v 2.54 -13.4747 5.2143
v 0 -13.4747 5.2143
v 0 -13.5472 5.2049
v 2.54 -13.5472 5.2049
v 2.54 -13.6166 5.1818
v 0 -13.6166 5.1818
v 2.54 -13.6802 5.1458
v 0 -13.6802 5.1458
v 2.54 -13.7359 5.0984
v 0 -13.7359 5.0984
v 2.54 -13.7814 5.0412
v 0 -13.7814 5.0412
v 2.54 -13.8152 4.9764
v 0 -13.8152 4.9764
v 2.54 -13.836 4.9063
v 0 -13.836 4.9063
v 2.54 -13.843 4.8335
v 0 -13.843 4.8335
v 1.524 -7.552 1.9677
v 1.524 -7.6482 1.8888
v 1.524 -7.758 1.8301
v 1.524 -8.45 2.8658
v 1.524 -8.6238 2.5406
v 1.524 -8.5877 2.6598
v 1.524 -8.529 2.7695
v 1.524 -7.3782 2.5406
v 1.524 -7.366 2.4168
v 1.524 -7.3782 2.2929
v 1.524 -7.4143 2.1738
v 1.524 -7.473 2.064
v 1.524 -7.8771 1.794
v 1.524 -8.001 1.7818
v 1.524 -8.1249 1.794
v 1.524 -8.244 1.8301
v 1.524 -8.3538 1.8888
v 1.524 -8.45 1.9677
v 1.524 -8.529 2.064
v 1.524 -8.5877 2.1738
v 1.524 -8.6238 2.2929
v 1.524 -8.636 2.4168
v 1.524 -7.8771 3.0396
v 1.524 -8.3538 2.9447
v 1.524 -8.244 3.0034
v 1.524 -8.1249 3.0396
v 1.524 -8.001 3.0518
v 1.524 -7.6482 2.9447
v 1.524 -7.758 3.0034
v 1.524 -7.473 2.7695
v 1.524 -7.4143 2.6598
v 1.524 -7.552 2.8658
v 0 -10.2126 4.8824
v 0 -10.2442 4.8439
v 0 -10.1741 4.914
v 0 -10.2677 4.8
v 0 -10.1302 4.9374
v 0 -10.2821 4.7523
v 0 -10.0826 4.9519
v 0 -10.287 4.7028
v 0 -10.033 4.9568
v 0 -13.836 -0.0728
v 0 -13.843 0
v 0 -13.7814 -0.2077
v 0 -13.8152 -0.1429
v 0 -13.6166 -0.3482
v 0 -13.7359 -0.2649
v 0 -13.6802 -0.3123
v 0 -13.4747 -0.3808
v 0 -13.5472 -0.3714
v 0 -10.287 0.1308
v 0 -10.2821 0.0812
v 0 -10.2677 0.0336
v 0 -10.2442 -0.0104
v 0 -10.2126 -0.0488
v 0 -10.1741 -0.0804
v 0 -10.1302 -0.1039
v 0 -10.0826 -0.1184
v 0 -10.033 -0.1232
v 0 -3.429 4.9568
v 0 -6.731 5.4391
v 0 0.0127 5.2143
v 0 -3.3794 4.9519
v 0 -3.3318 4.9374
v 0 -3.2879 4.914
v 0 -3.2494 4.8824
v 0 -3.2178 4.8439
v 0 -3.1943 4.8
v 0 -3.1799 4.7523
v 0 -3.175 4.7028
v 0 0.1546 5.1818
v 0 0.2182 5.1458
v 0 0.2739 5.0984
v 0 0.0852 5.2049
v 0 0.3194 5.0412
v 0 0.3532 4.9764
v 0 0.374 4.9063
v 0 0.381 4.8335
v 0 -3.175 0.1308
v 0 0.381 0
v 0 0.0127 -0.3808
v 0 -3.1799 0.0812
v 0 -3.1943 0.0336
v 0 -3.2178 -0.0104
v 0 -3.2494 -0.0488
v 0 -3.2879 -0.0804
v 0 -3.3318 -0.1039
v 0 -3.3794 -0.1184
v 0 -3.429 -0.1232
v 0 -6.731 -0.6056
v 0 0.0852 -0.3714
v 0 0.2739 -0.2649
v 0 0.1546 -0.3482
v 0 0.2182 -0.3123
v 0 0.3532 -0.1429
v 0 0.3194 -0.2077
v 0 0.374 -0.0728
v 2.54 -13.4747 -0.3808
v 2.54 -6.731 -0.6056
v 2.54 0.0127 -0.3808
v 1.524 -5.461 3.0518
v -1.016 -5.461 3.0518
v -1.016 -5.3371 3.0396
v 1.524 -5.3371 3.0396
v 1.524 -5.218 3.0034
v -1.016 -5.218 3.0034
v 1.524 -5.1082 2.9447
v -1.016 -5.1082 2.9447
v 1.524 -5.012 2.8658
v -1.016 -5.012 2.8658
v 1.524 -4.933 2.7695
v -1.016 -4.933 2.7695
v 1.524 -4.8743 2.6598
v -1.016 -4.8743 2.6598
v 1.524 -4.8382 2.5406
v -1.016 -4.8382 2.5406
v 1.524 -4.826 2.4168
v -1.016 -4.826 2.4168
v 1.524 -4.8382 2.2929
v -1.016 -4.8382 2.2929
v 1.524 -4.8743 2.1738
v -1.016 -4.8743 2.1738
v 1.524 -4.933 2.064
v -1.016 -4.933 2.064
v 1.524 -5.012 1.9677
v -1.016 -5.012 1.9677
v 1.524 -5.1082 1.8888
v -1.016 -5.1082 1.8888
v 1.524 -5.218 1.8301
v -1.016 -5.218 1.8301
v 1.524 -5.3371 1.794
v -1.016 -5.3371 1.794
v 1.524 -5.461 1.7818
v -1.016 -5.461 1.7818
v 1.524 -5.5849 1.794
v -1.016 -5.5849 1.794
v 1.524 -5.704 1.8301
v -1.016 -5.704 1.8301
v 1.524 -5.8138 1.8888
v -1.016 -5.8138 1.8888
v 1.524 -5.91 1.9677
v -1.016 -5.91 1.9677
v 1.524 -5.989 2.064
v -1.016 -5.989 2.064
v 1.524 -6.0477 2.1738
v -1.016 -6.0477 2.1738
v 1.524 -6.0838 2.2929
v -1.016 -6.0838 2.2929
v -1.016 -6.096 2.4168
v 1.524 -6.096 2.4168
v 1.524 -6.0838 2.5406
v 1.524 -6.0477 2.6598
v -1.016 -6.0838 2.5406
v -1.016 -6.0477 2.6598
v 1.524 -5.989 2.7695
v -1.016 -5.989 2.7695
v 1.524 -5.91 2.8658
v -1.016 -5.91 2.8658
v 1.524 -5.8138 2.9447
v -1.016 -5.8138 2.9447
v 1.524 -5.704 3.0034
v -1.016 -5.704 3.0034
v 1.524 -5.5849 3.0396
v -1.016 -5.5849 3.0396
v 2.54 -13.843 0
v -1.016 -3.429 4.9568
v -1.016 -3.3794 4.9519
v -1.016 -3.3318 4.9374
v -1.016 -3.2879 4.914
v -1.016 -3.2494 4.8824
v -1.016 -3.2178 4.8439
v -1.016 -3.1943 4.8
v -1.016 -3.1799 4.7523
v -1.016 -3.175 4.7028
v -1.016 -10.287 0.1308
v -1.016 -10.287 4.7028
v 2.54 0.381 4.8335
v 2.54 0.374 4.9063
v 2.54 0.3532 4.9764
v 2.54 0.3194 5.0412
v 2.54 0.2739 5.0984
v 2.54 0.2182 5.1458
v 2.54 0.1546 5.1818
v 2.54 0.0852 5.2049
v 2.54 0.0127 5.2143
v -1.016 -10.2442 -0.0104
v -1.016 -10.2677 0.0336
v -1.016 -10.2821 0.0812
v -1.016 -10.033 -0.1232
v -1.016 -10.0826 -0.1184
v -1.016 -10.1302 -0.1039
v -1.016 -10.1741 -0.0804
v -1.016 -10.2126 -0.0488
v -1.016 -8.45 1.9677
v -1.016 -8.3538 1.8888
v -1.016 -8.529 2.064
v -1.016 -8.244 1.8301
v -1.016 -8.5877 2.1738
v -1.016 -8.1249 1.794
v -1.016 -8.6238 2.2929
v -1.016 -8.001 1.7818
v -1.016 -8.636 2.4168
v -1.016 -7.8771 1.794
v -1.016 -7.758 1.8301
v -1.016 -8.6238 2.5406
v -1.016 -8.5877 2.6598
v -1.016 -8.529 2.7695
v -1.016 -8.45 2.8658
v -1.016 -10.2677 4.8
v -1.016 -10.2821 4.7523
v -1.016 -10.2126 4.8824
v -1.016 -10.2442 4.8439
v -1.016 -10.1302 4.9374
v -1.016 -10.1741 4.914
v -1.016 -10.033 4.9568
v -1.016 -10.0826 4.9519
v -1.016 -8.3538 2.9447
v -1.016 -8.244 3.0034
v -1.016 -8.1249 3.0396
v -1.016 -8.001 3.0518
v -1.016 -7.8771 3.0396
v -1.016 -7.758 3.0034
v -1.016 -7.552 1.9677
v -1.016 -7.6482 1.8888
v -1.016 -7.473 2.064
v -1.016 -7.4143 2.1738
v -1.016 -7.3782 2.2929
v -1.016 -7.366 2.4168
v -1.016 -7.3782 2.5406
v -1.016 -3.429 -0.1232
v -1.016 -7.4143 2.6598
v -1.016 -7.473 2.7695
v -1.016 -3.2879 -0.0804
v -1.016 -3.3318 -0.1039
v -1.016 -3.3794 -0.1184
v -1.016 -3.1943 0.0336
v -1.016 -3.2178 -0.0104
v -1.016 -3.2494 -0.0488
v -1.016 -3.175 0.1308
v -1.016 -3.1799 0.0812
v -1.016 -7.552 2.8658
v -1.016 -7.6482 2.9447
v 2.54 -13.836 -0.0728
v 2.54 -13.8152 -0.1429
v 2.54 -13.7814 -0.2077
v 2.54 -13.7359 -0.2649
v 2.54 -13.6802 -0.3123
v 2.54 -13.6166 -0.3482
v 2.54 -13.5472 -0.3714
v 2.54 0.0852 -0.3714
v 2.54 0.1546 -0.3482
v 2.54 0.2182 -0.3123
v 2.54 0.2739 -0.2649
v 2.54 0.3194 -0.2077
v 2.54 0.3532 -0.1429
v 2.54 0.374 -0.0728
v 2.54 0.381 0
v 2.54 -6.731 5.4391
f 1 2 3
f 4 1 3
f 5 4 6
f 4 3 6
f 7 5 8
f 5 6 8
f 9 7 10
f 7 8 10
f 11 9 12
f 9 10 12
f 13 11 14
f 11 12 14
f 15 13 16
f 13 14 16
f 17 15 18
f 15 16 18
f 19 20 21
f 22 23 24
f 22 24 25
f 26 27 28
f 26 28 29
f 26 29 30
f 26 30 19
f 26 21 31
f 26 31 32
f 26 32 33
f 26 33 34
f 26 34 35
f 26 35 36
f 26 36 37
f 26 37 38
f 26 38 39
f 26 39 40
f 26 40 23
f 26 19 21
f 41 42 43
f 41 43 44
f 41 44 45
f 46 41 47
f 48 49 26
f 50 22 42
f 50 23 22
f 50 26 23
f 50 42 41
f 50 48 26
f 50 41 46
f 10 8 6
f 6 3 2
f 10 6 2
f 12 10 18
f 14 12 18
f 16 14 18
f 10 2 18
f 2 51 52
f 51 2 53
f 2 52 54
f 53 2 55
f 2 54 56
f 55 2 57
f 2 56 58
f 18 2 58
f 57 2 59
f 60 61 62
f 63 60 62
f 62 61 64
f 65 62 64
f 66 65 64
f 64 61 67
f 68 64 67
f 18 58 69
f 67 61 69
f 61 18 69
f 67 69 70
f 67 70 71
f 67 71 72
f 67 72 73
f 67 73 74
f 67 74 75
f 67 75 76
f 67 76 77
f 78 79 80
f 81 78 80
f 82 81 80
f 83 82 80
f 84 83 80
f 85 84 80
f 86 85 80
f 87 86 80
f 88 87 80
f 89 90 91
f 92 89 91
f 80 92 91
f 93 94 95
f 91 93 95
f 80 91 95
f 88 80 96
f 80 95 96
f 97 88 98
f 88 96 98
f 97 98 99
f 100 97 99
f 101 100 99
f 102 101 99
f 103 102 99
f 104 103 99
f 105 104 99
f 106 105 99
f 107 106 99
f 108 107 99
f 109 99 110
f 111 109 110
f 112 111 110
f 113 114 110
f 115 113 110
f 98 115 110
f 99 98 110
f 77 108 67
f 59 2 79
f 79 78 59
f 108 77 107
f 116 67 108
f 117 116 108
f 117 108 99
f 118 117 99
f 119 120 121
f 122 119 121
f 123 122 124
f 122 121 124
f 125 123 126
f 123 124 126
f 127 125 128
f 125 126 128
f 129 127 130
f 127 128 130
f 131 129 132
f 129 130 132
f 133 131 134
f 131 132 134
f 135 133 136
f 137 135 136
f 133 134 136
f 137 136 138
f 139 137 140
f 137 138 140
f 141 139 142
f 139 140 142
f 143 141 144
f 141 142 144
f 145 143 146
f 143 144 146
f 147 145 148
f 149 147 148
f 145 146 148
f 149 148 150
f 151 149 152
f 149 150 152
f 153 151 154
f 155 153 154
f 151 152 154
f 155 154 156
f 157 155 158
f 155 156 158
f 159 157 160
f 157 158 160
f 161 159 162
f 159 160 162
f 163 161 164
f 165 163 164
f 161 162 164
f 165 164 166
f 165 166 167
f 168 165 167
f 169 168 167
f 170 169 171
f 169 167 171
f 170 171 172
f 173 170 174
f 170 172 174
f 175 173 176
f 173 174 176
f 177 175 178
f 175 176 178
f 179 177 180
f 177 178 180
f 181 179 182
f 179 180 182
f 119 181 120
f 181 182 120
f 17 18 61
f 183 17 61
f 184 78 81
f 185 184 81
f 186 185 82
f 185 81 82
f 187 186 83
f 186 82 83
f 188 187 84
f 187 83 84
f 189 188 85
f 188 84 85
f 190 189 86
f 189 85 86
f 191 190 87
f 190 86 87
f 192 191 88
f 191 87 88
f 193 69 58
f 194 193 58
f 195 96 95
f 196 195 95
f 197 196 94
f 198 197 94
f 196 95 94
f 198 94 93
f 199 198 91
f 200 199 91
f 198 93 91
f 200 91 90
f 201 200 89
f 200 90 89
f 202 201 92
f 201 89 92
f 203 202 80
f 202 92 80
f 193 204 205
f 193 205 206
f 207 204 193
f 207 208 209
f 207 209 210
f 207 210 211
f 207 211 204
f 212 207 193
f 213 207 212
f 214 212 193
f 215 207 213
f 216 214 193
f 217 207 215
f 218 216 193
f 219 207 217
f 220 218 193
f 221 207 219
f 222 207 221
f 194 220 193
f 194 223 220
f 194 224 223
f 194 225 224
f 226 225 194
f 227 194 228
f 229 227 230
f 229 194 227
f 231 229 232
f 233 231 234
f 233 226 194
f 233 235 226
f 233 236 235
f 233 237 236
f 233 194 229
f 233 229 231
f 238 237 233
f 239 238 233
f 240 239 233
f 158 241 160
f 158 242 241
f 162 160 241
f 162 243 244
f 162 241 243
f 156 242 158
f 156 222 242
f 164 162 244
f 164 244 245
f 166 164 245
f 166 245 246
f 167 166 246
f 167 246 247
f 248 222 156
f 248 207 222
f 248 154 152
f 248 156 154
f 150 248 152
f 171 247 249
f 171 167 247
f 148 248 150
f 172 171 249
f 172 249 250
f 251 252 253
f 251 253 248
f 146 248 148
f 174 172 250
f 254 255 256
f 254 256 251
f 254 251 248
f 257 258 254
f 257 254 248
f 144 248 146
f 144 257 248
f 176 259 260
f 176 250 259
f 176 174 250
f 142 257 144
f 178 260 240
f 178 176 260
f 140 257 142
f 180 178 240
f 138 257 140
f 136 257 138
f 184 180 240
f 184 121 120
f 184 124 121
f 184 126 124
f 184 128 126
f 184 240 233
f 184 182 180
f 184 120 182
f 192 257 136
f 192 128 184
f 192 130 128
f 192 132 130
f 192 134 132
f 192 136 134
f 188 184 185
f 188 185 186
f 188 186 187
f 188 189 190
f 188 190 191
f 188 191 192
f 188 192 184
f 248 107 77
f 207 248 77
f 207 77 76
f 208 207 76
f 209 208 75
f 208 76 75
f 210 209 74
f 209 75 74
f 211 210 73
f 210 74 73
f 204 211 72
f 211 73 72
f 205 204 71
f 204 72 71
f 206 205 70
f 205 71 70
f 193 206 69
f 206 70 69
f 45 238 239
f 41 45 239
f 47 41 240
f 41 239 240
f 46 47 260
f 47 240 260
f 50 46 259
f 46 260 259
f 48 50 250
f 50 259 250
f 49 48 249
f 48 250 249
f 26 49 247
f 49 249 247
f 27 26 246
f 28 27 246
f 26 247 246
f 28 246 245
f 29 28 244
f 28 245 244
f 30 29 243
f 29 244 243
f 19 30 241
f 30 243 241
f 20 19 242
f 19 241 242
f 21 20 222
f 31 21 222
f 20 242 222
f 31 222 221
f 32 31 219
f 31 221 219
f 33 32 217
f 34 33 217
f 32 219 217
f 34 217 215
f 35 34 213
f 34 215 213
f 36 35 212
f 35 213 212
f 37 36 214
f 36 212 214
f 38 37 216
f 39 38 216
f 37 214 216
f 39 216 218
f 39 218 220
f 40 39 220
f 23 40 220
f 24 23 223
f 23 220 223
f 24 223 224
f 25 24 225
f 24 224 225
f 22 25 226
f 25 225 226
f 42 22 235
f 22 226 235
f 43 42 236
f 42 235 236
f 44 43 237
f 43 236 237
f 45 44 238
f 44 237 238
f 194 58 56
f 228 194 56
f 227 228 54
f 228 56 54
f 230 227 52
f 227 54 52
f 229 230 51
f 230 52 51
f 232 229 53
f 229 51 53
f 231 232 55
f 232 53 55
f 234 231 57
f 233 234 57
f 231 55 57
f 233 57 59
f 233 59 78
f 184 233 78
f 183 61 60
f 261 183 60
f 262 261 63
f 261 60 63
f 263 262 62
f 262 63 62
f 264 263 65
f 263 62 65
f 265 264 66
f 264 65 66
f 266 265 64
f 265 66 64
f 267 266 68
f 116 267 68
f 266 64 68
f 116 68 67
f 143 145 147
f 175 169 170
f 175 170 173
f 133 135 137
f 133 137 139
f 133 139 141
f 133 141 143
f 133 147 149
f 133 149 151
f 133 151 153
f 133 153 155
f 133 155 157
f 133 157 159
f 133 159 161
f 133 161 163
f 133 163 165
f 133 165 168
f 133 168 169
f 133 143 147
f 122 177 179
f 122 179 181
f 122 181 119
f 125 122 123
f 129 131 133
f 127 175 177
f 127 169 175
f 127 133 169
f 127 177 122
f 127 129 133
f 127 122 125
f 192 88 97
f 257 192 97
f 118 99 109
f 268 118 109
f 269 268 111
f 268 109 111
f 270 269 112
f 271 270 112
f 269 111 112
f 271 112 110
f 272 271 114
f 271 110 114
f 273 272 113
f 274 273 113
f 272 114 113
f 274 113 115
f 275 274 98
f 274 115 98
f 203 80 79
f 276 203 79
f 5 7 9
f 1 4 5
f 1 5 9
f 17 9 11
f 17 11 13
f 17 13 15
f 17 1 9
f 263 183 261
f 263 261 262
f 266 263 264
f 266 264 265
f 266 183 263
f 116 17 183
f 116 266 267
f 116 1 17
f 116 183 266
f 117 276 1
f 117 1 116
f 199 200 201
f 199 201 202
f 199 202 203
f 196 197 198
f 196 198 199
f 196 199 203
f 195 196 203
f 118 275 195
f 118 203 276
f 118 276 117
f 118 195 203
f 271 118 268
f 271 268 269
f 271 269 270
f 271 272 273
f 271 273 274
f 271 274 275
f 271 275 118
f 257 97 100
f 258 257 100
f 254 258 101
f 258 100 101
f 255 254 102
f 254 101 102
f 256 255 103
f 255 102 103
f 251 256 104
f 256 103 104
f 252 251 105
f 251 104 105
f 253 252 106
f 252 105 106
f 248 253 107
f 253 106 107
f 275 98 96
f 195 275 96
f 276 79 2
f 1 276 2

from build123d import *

# Parameters (mm, degrees)
BOSS_EXTRUDE1_DEPTH = 2.54
BOSS_EXTRUDE2_DEPTH = 1.016
SKETCH6_R           = 0.635
CUT_EXTRUDE1_DEPTH  = 2.54


with BuildPart() as part:
    # Sketch1 → Boss-Extrude1 (new body)
    with BuildSketch(Plane(origin=(0, 0, 0), x_dir=(0, 0, -1), z_dir=(1, 0, 0))):
        with BuildLine():
            Line((0.380788543, -13.474691937), (0.605560313, -6.731))
            Line((0.605560313, -6.731), (0.380788543, 0.012691937))
            ThreePointArc((0.380788543, 0.012691937), (0.2648824, 0.273858201), (0, 0.381))
            Line((0, 0.381), (-4.833515176, 0.381))
            ThreePointArc((-4.833515176, 0.381), (-5.098397576, 0.273858201), (-5.214303719, 0.012691937))
            Line((-5.214303719, 0.012691937), (-5.439075489, -6.731))
            Line((-5.439075489, -6.731), (-5.214303719, -13.474691937))
            ThreePointArc((-5.214303719, -13.474691937), (-5.098397576, -13.735858201), (-4.833515176, -13.843))
            Line((-4.833515176, -13.843), (0, -13.843))
            ThreePointArc((0, -13.843), (0.2648824, -13.735858201), (0.380788543, -13.474691937))
        make_face()
    extrude(amount=BOSS_EXTRUDE1_DEPTH)

    # Sketch5 → Boss-Extrude2 (add)
    with BuildSketch(Plane.ZY):
        with BuildLine():
            Line((0.130757588, -10.287), (4.702757588, -10.287))
            ThreePointArc((4.702757588, -10.287), (4.88236271, -10.212605122), (4.956757588, -10.033))
            Line((4.956757588, -10.033), (4.956757588, -3.429))
            ThreePointArc((4.956757588, -3.429), (4.88236271, -3.249394878), (4.702757588, -3.175))
            Line((4.702757588, -3.175), (0.130757588, -3.175))
            ThreePointArc((0.130757588, -3.175), (-0.048847535, -3.249394878), (-0.123242412, -3.429))
            Line((-0.123242412, -3.429), (-0.123242412, -10.033))
            ThreePointArc((-0.123242412, -10.033), (-0.048847535, -10.212605122), (0.130757588, -10.287))
        make_face()
    extrude(amount=BOSS_EXTRUDE2_DEPTH)

    # Sketch6 → Cut-Extrude1 (cut)
    with BuildSketch(Plane.ZY.offset(1.016)):
        with Locations((2.416757588, -5.461)):
            Circle(SKETCH6_R)
        with Locations((2.416757588, -8.001)):
            Circle(SKETCH6_R)
    extrude(amount=-CUT_EXTRUDE1_DEPTH, mode=Mode.SUBTRACT)


solid = part.part
